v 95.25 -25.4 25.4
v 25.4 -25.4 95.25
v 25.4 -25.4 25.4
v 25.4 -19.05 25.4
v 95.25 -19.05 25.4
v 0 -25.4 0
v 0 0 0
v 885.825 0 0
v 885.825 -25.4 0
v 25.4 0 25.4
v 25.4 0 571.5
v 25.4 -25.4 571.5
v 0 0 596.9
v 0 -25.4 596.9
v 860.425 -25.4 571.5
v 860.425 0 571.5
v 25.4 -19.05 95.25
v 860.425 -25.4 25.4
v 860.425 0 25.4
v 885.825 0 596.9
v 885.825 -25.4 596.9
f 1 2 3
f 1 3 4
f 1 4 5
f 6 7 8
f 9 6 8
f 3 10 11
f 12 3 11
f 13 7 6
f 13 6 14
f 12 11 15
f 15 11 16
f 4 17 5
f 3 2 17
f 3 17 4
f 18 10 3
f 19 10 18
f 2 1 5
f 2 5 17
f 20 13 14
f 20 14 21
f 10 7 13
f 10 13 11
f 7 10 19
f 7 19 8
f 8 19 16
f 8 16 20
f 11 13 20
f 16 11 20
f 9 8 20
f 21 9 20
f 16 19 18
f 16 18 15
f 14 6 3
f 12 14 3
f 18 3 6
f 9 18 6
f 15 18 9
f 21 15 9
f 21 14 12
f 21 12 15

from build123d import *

# Parameters (mm, degrees)
F0_W     = 885.825
F0_H     = 596.9
F0_W_2   = 835.025
F0_H_2   = 546.1
F1_DEPTH = 25.4
F3_DEPTH = 6.35


with BuildPart() as f1:
    # F0 (on Front) → F1 (new body)
    with BuildSketch(Plane.XZ):
        with Locations((442.9125, 298.45)):
            Rectangle(F0_W, F0_H)
        with Locations((442.9125, 298.45)):
            Rectangle(F0_W_2, F0_H_2, mode=Mode.SUBTRACT)
    extrude(amount=F1_DEPTH)


with BuildPart() as f3:
    # F2 (on face) → F3 (new body)
    with BuildSketch(Plane.XZ.offset(25.4)):
        Polygon((25.4, 95.25), (25.4, 25.4), (95.25, 25.4), align=None)
    extrude(amount=-F3_DEPTH)


solid = Compound([f1.part, f3.part])
